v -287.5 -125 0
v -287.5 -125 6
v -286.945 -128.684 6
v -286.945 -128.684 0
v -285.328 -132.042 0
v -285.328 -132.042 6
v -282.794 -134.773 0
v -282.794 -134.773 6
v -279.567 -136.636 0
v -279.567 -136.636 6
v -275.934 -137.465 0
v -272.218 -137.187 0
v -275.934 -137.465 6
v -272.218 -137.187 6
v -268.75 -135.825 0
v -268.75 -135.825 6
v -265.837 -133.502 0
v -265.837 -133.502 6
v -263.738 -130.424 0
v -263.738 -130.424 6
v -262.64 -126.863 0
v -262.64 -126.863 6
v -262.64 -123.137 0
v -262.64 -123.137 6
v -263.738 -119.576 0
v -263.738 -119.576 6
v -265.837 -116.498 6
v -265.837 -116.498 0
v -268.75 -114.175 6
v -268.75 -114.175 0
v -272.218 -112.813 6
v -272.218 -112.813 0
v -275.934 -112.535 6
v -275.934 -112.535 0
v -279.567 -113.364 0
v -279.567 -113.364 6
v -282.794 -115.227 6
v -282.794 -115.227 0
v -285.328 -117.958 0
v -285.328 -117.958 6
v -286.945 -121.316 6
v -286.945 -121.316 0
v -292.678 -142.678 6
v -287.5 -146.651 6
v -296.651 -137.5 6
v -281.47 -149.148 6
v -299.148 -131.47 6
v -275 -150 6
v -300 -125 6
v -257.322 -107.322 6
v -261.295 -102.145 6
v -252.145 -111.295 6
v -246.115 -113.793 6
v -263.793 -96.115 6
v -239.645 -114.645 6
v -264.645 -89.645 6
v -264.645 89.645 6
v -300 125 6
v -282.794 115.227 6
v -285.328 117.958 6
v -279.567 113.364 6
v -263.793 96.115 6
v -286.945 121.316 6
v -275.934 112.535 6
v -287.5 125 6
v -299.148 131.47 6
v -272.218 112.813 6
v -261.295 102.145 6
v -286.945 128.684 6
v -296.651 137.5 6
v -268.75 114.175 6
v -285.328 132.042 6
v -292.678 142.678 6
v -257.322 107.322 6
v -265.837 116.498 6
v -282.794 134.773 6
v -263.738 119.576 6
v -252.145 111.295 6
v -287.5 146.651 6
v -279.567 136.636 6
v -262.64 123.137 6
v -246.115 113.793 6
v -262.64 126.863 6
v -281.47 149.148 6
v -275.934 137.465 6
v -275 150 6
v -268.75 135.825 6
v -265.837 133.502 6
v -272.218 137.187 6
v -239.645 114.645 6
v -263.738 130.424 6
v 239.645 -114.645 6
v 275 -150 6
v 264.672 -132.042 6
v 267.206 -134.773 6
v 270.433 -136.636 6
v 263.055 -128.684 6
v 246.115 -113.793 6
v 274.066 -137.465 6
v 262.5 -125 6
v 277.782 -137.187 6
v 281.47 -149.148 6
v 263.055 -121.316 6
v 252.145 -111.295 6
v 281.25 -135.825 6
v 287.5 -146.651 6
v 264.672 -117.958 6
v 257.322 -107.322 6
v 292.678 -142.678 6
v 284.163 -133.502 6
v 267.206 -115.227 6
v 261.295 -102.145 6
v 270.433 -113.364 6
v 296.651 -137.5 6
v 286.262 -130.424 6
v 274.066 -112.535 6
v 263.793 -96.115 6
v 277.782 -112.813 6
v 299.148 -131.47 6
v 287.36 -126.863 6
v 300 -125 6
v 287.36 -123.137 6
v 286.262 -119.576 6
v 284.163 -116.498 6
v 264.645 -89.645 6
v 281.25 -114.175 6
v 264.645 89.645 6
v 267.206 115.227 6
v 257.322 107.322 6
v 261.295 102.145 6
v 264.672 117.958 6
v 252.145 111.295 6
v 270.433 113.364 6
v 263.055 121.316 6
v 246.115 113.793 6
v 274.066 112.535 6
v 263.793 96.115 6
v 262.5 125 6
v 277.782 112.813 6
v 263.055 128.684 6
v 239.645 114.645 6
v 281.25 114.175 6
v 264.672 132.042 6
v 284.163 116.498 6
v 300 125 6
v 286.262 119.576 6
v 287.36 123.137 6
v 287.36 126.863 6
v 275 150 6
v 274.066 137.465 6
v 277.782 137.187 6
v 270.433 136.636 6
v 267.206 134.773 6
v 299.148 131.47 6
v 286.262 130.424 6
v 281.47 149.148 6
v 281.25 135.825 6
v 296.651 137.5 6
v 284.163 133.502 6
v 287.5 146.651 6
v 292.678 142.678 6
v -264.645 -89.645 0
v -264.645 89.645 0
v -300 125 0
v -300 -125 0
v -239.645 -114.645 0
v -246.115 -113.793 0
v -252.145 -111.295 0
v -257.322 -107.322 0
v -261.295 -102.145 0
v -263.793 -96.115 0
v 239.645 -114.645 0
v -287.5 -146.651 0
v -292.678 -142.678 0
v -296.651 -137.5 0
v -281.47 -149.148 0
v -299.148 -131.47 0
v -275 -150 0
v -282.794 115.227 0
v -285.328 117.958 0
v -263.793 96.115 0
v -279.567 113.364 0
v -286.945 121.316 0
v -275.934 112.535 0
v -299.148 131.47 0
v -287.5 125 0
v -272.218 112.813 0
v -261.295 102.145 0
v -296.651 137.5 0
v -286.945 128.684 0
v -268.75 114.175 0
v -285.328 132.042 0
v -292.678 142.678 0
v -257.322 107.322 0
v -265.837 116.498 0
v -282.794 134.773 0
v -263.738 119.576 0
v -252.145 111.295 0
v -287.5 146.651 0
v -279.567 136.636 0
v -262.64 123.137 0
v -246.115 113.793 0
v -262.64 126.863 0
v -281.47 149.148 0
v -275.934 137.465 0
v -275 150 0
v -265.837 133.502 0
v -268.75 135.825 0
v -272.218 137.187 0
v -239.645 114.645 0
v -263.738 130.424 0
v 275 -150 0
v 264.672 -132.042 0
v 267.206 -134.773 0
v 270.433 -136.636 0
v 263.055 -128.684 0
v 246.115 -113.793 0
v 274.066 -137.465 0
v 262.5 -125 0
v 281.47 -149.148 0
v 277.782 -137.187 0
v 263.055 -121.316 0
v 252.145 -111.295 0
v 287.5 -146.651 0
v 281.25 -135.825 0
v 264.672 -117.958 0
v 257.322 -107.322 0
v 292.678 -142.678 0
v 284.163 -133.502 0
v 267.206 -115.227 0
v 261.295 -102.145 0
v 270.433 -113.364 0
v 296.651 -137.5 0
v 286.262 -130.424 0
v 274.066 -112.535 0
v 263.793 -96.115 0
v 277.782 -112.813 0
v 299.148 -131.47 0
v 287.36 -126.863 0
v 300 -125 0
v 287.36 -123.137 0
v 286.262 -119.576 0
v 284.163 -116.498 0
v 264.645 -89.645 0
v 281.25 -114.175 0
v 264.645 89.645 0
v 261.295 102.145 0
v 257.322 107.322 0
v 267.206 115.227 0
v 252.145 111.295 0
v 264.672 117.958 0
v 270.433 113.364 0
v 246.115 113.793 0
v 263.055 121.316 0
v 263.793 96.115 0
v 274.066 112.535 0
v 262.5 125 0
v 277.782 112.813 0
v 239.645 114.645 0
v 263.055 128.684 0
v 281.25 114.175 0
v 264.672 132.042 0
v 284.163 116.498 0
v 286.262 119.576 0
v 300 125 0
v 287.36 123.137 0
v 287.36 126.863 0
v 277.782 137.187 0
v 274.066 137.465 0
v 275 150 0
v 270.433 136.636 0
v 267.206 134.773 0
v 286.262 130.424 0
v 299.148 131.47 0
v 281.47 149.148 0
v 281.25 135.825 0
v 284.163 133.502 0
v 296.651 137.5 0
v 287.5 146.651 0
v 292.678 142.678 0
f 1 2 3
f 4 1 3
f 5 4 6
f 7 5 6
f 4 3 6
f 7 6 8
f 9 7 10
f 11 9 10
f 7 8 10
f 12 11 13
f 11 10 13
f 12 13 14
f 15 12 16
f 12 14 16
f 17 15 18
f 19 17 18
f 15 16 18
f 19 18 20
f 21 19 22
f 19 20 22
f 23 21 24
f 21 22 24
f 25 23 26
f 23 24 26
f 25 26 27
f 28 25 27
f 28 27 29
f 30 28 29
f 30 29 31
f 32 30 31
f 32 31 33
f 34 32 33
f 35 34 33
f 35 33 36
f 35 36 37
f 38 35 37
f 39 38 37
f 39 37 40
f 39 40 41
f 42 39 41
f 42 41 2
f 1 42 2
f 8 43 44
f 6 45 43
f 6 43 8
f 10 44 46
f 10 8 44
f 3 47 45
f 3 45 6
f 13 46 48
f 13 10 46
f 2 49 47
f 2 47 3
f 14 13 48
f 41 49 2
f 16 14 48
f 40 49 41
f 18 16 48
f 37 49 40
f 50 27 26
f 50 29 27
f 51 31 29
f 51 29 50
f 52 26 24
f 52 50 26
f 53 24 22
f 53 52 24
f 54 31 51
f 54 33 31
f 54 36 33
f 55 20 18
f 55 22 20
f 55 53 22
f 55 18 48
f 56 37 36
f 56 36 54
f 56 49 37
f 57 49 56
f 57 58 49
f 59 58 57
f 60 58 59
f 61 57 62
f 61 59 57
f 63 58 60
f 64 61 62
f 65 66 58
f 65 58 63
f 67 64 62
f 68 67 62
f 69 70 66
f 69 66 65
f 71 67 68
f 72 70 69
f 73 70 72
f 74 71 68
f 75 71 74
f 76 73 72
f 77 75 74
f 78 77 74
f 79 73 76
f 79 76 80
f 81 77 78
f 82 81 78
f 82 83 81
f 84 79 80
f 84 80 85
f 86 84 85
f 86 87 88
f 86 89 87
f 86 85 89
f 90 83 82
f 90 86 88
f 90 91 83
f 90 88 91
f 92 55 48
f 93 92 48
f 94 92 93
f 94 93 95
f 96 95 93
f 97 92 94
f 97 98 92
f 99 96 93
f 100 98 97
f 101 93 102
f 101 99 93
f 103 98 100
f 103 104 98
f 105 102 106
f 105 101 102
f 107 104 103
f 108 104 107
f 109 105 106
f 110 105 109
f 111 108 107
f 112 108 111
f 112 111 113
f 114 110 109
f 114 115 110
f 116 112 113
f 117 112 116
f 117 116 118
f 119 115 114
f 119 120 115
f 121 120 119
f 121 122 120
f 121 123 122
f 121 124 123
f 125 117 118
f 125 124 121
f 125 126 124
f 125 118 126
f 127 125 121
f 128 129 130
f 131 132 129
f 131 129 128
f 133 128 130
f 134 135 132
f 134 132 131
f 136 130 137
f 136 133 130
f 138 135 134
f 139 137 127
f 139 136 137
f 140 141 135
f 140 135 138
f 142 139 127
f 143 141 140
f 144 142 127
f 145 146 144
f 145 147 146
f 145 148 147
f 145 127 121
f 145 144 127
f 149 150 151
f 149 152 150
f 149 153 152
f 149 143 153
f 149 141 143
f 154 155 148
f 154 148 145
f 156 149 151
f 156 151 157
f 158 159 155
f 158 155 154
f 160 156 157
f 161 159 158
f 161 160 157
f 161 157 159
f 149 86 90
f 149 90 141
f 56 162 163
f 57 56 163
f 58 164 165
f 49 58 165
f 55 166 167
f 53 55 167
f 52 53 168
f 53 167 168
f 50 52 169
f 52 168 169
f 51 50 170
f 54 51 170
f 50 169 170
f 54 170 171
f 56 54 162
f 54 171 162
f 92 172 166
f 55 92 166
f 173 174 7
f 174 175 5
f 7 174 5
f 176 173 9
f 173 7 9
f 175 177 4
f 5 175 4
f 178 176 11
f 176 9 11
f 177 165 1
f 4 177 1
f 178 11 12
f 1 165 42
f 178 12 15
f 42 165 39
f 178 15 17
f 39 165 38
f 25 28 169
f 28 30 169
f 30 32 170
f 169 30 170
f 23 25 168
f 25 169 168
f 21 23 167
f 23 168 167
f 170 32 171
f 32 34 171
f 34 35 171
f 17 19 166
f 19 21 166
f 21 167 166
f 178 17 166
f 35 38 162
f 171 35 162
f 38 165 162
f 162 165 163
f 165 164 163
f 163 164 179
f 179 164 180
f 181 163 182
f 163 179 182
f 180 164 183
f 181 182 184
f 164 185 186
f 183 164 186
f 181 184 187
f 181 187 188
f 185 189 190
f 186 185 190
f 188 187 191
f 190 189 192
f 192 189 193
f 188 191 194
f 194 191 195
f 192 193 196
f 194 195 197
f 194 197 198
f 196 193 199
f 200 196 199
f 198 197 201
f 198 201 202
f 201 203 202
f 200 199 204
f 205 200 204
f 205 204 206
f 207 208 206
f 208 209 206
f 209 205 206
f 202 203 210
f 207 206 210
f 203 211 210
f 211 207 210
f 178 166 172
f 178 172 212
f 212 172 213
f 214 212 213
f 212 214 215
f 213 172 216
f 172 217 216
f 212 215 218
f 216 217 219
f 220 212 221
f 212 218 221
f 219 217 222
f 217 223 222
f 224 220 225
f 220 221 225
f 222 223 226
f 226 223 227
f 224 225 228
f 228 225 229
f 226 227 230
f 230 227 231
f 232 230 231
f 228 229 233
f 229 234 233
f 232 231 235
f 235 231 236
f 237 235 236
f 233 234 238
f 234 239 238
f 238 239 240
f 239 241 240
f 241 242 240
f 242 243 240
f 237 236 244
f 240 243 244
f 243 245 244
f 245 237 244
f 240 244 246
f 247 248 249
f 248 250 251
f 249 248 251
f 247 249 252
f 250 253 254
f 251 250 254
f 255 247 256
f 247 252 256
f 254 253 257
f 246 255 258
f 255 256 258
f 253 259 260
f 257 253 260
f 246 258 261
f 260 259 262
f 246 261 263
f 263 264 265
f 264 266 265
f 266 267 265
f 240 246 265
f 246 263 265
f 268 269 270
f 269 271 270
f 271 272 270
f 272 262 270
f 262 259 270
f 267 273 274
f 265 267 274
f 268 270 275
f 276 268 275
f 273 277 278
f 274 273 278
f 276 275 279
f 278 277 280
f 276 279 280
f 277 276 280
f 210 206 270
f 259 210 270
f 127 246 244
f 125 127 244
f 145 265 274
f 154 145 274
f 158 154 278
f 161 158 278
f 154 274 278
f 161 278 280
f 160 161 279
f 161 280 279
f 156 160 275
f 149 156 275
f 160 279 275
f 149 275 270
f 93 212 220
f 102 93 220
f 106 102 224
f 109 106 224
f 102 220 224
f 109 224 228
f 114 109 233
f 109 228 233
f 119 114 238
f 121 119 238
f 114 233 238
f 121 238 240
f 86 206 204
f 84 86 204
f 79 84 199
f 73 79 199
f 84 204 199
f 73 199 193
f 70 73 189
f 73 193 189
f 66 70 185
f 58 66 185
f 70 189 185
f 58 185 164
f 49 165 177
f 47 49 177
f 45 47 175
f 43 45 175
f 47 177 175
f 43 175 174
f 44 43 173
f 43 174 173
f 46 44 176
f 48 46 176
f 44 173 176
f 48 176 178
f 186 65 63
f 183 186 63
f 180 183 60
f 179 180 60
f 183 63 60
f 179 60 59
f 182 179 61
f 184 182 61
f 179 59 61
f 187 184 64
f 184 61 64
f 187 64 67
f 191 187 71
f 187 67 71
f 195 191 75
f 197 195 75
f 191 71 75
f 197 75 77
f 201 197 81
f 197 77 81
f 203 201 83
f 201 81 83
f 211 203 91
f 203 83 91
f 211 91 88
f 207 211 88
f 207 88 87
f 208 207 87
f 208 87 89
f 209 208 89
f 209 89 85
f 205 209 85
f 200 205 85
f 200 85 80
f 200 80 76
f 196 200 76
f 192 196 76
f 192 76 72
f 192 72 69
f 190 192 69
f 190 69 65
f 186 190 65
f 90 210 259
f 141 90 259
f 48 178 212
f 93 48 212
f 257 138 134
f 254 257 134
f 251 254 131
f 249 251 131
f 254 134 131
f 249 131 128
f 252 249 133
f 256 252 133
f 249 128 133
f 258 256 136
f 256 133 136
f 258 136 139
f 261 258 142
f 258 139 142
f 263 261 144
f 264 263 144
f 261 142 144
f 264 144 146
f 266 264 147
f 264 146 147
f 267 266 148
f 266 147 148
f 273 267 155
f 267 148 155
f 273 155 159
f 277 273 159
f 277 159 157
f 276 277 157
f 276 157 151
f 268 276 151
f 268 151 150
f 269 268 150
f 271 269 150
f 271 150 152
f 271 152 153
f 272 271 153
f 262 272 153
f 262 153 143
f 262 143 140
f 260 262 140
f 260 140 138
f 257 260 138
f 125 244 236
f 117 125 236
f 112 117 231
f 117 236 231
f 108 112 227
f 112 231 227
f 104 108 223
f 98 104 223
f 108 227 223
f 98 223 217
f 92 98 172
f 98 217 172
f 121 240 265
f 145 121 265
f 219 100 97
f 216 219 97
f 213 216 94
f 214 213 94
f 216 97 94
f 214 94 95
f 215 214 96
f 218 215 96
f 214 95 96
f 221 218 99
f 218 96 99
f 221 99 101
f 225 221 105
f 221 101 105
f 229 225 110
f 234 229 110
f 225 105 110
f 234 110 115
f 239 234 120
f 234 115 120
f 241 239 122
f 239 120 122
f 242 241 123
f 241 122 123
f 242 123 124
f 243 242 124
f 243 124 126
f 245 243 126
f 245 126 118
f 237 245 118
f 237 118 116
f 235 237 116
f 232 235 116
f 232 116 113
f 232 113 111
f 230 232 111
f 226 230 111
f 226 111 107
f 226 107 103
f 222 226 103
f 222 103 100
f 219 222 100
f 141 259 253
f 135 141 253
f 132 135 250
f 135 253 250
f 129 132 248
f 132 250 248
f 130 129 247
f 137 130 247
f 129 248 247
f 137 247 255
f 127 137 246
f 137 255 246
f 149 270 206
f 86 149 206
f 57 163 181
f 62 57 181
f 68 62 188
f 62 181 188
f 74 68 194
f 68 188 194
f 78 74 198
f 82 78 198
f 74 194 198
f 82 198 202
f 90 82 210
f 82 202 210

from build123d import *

# Parameters (mm, degrees)
F1_DEPTH = 6
F2_D     = 25
F3_D     = 25
F4_D     = 25


with BuildPart() as f1:
    # F0 (on Top) → F1 (new body)
    with BuildSketch(Plane.XY):
        with BuildLine():
            Line((-275, -150), (275, -150))
            ThreePointArc((275, -150), (292.67767, -142.67767), (300, -125))
            Line((300, -125), (300, 125))
            ThreePointArc((300, 125), (292.67767, 142.67767), (275, 150))
            Line((275, 150), (-275, 150))
            ThreePointArc((-275, 150), (-292.67767, 142.67767), (-300, 125))
            Line((-300, 125), (-300, -125))
            ThreePointArc((-300, -125), (-292.67767, -142.67767), (-275, -150))
        make_face()
        with BuildLine():
            ThreePointArc((264.644661, -89.644661), (257.32233, -107.32233), (239.644661, -114.644661))
            Line((239.644661, -114.644661), (-239.644661, -114.644661))
            ThreePointArc((-239.644661, -114.644661), (-257.32233, -107.32233), (-264.644661, -89.644661))
            Line((-264.644661, -89.644661), (-264.644661, 89.644661))
            ThreePointArc((-264.644661, 89.644661), (-257.32233, 107.32233), (-239.644661, 114.644661))
            Line((-239.644661, 114.644661), (239.644661, 114.644661))
            ThreePointArc((239.644661, 114.644661), (257.32233, 107.32233), (264.644661, 89.644661))
            Line((264.644661, 89.644661), (264.644661, -89.644661))
        make_face(mode=Mode.SUBTRACT)
    extrude(amount=F1_DEPTH)

    # F2 (through all)
    with Locations(Plane(origin=(0, 0, 0), x_dir=(1, 0, 0), z_dir=(0, 0, -1))):
        with Locations((-275, -125)):
            Hole(F2_D / 2)

    # F3 (through all)
    with Locations(Plane(origin=(0, 0, 0), x_dir=(1, 0, 0), z_dir=(0, 0, -1))):
        with Locations((-275, 125), (275, -125)):
            Hole(F3_D / 2)

    # F4 (through all)
    with Locations(Plane(origin=(0, 0, 0), x_dir=(1, 0, 0), z_dir=(0, 0, -1))):
        with Locations((275, 125)):
            Hole(F4_D / 2)


solid = f1.part
